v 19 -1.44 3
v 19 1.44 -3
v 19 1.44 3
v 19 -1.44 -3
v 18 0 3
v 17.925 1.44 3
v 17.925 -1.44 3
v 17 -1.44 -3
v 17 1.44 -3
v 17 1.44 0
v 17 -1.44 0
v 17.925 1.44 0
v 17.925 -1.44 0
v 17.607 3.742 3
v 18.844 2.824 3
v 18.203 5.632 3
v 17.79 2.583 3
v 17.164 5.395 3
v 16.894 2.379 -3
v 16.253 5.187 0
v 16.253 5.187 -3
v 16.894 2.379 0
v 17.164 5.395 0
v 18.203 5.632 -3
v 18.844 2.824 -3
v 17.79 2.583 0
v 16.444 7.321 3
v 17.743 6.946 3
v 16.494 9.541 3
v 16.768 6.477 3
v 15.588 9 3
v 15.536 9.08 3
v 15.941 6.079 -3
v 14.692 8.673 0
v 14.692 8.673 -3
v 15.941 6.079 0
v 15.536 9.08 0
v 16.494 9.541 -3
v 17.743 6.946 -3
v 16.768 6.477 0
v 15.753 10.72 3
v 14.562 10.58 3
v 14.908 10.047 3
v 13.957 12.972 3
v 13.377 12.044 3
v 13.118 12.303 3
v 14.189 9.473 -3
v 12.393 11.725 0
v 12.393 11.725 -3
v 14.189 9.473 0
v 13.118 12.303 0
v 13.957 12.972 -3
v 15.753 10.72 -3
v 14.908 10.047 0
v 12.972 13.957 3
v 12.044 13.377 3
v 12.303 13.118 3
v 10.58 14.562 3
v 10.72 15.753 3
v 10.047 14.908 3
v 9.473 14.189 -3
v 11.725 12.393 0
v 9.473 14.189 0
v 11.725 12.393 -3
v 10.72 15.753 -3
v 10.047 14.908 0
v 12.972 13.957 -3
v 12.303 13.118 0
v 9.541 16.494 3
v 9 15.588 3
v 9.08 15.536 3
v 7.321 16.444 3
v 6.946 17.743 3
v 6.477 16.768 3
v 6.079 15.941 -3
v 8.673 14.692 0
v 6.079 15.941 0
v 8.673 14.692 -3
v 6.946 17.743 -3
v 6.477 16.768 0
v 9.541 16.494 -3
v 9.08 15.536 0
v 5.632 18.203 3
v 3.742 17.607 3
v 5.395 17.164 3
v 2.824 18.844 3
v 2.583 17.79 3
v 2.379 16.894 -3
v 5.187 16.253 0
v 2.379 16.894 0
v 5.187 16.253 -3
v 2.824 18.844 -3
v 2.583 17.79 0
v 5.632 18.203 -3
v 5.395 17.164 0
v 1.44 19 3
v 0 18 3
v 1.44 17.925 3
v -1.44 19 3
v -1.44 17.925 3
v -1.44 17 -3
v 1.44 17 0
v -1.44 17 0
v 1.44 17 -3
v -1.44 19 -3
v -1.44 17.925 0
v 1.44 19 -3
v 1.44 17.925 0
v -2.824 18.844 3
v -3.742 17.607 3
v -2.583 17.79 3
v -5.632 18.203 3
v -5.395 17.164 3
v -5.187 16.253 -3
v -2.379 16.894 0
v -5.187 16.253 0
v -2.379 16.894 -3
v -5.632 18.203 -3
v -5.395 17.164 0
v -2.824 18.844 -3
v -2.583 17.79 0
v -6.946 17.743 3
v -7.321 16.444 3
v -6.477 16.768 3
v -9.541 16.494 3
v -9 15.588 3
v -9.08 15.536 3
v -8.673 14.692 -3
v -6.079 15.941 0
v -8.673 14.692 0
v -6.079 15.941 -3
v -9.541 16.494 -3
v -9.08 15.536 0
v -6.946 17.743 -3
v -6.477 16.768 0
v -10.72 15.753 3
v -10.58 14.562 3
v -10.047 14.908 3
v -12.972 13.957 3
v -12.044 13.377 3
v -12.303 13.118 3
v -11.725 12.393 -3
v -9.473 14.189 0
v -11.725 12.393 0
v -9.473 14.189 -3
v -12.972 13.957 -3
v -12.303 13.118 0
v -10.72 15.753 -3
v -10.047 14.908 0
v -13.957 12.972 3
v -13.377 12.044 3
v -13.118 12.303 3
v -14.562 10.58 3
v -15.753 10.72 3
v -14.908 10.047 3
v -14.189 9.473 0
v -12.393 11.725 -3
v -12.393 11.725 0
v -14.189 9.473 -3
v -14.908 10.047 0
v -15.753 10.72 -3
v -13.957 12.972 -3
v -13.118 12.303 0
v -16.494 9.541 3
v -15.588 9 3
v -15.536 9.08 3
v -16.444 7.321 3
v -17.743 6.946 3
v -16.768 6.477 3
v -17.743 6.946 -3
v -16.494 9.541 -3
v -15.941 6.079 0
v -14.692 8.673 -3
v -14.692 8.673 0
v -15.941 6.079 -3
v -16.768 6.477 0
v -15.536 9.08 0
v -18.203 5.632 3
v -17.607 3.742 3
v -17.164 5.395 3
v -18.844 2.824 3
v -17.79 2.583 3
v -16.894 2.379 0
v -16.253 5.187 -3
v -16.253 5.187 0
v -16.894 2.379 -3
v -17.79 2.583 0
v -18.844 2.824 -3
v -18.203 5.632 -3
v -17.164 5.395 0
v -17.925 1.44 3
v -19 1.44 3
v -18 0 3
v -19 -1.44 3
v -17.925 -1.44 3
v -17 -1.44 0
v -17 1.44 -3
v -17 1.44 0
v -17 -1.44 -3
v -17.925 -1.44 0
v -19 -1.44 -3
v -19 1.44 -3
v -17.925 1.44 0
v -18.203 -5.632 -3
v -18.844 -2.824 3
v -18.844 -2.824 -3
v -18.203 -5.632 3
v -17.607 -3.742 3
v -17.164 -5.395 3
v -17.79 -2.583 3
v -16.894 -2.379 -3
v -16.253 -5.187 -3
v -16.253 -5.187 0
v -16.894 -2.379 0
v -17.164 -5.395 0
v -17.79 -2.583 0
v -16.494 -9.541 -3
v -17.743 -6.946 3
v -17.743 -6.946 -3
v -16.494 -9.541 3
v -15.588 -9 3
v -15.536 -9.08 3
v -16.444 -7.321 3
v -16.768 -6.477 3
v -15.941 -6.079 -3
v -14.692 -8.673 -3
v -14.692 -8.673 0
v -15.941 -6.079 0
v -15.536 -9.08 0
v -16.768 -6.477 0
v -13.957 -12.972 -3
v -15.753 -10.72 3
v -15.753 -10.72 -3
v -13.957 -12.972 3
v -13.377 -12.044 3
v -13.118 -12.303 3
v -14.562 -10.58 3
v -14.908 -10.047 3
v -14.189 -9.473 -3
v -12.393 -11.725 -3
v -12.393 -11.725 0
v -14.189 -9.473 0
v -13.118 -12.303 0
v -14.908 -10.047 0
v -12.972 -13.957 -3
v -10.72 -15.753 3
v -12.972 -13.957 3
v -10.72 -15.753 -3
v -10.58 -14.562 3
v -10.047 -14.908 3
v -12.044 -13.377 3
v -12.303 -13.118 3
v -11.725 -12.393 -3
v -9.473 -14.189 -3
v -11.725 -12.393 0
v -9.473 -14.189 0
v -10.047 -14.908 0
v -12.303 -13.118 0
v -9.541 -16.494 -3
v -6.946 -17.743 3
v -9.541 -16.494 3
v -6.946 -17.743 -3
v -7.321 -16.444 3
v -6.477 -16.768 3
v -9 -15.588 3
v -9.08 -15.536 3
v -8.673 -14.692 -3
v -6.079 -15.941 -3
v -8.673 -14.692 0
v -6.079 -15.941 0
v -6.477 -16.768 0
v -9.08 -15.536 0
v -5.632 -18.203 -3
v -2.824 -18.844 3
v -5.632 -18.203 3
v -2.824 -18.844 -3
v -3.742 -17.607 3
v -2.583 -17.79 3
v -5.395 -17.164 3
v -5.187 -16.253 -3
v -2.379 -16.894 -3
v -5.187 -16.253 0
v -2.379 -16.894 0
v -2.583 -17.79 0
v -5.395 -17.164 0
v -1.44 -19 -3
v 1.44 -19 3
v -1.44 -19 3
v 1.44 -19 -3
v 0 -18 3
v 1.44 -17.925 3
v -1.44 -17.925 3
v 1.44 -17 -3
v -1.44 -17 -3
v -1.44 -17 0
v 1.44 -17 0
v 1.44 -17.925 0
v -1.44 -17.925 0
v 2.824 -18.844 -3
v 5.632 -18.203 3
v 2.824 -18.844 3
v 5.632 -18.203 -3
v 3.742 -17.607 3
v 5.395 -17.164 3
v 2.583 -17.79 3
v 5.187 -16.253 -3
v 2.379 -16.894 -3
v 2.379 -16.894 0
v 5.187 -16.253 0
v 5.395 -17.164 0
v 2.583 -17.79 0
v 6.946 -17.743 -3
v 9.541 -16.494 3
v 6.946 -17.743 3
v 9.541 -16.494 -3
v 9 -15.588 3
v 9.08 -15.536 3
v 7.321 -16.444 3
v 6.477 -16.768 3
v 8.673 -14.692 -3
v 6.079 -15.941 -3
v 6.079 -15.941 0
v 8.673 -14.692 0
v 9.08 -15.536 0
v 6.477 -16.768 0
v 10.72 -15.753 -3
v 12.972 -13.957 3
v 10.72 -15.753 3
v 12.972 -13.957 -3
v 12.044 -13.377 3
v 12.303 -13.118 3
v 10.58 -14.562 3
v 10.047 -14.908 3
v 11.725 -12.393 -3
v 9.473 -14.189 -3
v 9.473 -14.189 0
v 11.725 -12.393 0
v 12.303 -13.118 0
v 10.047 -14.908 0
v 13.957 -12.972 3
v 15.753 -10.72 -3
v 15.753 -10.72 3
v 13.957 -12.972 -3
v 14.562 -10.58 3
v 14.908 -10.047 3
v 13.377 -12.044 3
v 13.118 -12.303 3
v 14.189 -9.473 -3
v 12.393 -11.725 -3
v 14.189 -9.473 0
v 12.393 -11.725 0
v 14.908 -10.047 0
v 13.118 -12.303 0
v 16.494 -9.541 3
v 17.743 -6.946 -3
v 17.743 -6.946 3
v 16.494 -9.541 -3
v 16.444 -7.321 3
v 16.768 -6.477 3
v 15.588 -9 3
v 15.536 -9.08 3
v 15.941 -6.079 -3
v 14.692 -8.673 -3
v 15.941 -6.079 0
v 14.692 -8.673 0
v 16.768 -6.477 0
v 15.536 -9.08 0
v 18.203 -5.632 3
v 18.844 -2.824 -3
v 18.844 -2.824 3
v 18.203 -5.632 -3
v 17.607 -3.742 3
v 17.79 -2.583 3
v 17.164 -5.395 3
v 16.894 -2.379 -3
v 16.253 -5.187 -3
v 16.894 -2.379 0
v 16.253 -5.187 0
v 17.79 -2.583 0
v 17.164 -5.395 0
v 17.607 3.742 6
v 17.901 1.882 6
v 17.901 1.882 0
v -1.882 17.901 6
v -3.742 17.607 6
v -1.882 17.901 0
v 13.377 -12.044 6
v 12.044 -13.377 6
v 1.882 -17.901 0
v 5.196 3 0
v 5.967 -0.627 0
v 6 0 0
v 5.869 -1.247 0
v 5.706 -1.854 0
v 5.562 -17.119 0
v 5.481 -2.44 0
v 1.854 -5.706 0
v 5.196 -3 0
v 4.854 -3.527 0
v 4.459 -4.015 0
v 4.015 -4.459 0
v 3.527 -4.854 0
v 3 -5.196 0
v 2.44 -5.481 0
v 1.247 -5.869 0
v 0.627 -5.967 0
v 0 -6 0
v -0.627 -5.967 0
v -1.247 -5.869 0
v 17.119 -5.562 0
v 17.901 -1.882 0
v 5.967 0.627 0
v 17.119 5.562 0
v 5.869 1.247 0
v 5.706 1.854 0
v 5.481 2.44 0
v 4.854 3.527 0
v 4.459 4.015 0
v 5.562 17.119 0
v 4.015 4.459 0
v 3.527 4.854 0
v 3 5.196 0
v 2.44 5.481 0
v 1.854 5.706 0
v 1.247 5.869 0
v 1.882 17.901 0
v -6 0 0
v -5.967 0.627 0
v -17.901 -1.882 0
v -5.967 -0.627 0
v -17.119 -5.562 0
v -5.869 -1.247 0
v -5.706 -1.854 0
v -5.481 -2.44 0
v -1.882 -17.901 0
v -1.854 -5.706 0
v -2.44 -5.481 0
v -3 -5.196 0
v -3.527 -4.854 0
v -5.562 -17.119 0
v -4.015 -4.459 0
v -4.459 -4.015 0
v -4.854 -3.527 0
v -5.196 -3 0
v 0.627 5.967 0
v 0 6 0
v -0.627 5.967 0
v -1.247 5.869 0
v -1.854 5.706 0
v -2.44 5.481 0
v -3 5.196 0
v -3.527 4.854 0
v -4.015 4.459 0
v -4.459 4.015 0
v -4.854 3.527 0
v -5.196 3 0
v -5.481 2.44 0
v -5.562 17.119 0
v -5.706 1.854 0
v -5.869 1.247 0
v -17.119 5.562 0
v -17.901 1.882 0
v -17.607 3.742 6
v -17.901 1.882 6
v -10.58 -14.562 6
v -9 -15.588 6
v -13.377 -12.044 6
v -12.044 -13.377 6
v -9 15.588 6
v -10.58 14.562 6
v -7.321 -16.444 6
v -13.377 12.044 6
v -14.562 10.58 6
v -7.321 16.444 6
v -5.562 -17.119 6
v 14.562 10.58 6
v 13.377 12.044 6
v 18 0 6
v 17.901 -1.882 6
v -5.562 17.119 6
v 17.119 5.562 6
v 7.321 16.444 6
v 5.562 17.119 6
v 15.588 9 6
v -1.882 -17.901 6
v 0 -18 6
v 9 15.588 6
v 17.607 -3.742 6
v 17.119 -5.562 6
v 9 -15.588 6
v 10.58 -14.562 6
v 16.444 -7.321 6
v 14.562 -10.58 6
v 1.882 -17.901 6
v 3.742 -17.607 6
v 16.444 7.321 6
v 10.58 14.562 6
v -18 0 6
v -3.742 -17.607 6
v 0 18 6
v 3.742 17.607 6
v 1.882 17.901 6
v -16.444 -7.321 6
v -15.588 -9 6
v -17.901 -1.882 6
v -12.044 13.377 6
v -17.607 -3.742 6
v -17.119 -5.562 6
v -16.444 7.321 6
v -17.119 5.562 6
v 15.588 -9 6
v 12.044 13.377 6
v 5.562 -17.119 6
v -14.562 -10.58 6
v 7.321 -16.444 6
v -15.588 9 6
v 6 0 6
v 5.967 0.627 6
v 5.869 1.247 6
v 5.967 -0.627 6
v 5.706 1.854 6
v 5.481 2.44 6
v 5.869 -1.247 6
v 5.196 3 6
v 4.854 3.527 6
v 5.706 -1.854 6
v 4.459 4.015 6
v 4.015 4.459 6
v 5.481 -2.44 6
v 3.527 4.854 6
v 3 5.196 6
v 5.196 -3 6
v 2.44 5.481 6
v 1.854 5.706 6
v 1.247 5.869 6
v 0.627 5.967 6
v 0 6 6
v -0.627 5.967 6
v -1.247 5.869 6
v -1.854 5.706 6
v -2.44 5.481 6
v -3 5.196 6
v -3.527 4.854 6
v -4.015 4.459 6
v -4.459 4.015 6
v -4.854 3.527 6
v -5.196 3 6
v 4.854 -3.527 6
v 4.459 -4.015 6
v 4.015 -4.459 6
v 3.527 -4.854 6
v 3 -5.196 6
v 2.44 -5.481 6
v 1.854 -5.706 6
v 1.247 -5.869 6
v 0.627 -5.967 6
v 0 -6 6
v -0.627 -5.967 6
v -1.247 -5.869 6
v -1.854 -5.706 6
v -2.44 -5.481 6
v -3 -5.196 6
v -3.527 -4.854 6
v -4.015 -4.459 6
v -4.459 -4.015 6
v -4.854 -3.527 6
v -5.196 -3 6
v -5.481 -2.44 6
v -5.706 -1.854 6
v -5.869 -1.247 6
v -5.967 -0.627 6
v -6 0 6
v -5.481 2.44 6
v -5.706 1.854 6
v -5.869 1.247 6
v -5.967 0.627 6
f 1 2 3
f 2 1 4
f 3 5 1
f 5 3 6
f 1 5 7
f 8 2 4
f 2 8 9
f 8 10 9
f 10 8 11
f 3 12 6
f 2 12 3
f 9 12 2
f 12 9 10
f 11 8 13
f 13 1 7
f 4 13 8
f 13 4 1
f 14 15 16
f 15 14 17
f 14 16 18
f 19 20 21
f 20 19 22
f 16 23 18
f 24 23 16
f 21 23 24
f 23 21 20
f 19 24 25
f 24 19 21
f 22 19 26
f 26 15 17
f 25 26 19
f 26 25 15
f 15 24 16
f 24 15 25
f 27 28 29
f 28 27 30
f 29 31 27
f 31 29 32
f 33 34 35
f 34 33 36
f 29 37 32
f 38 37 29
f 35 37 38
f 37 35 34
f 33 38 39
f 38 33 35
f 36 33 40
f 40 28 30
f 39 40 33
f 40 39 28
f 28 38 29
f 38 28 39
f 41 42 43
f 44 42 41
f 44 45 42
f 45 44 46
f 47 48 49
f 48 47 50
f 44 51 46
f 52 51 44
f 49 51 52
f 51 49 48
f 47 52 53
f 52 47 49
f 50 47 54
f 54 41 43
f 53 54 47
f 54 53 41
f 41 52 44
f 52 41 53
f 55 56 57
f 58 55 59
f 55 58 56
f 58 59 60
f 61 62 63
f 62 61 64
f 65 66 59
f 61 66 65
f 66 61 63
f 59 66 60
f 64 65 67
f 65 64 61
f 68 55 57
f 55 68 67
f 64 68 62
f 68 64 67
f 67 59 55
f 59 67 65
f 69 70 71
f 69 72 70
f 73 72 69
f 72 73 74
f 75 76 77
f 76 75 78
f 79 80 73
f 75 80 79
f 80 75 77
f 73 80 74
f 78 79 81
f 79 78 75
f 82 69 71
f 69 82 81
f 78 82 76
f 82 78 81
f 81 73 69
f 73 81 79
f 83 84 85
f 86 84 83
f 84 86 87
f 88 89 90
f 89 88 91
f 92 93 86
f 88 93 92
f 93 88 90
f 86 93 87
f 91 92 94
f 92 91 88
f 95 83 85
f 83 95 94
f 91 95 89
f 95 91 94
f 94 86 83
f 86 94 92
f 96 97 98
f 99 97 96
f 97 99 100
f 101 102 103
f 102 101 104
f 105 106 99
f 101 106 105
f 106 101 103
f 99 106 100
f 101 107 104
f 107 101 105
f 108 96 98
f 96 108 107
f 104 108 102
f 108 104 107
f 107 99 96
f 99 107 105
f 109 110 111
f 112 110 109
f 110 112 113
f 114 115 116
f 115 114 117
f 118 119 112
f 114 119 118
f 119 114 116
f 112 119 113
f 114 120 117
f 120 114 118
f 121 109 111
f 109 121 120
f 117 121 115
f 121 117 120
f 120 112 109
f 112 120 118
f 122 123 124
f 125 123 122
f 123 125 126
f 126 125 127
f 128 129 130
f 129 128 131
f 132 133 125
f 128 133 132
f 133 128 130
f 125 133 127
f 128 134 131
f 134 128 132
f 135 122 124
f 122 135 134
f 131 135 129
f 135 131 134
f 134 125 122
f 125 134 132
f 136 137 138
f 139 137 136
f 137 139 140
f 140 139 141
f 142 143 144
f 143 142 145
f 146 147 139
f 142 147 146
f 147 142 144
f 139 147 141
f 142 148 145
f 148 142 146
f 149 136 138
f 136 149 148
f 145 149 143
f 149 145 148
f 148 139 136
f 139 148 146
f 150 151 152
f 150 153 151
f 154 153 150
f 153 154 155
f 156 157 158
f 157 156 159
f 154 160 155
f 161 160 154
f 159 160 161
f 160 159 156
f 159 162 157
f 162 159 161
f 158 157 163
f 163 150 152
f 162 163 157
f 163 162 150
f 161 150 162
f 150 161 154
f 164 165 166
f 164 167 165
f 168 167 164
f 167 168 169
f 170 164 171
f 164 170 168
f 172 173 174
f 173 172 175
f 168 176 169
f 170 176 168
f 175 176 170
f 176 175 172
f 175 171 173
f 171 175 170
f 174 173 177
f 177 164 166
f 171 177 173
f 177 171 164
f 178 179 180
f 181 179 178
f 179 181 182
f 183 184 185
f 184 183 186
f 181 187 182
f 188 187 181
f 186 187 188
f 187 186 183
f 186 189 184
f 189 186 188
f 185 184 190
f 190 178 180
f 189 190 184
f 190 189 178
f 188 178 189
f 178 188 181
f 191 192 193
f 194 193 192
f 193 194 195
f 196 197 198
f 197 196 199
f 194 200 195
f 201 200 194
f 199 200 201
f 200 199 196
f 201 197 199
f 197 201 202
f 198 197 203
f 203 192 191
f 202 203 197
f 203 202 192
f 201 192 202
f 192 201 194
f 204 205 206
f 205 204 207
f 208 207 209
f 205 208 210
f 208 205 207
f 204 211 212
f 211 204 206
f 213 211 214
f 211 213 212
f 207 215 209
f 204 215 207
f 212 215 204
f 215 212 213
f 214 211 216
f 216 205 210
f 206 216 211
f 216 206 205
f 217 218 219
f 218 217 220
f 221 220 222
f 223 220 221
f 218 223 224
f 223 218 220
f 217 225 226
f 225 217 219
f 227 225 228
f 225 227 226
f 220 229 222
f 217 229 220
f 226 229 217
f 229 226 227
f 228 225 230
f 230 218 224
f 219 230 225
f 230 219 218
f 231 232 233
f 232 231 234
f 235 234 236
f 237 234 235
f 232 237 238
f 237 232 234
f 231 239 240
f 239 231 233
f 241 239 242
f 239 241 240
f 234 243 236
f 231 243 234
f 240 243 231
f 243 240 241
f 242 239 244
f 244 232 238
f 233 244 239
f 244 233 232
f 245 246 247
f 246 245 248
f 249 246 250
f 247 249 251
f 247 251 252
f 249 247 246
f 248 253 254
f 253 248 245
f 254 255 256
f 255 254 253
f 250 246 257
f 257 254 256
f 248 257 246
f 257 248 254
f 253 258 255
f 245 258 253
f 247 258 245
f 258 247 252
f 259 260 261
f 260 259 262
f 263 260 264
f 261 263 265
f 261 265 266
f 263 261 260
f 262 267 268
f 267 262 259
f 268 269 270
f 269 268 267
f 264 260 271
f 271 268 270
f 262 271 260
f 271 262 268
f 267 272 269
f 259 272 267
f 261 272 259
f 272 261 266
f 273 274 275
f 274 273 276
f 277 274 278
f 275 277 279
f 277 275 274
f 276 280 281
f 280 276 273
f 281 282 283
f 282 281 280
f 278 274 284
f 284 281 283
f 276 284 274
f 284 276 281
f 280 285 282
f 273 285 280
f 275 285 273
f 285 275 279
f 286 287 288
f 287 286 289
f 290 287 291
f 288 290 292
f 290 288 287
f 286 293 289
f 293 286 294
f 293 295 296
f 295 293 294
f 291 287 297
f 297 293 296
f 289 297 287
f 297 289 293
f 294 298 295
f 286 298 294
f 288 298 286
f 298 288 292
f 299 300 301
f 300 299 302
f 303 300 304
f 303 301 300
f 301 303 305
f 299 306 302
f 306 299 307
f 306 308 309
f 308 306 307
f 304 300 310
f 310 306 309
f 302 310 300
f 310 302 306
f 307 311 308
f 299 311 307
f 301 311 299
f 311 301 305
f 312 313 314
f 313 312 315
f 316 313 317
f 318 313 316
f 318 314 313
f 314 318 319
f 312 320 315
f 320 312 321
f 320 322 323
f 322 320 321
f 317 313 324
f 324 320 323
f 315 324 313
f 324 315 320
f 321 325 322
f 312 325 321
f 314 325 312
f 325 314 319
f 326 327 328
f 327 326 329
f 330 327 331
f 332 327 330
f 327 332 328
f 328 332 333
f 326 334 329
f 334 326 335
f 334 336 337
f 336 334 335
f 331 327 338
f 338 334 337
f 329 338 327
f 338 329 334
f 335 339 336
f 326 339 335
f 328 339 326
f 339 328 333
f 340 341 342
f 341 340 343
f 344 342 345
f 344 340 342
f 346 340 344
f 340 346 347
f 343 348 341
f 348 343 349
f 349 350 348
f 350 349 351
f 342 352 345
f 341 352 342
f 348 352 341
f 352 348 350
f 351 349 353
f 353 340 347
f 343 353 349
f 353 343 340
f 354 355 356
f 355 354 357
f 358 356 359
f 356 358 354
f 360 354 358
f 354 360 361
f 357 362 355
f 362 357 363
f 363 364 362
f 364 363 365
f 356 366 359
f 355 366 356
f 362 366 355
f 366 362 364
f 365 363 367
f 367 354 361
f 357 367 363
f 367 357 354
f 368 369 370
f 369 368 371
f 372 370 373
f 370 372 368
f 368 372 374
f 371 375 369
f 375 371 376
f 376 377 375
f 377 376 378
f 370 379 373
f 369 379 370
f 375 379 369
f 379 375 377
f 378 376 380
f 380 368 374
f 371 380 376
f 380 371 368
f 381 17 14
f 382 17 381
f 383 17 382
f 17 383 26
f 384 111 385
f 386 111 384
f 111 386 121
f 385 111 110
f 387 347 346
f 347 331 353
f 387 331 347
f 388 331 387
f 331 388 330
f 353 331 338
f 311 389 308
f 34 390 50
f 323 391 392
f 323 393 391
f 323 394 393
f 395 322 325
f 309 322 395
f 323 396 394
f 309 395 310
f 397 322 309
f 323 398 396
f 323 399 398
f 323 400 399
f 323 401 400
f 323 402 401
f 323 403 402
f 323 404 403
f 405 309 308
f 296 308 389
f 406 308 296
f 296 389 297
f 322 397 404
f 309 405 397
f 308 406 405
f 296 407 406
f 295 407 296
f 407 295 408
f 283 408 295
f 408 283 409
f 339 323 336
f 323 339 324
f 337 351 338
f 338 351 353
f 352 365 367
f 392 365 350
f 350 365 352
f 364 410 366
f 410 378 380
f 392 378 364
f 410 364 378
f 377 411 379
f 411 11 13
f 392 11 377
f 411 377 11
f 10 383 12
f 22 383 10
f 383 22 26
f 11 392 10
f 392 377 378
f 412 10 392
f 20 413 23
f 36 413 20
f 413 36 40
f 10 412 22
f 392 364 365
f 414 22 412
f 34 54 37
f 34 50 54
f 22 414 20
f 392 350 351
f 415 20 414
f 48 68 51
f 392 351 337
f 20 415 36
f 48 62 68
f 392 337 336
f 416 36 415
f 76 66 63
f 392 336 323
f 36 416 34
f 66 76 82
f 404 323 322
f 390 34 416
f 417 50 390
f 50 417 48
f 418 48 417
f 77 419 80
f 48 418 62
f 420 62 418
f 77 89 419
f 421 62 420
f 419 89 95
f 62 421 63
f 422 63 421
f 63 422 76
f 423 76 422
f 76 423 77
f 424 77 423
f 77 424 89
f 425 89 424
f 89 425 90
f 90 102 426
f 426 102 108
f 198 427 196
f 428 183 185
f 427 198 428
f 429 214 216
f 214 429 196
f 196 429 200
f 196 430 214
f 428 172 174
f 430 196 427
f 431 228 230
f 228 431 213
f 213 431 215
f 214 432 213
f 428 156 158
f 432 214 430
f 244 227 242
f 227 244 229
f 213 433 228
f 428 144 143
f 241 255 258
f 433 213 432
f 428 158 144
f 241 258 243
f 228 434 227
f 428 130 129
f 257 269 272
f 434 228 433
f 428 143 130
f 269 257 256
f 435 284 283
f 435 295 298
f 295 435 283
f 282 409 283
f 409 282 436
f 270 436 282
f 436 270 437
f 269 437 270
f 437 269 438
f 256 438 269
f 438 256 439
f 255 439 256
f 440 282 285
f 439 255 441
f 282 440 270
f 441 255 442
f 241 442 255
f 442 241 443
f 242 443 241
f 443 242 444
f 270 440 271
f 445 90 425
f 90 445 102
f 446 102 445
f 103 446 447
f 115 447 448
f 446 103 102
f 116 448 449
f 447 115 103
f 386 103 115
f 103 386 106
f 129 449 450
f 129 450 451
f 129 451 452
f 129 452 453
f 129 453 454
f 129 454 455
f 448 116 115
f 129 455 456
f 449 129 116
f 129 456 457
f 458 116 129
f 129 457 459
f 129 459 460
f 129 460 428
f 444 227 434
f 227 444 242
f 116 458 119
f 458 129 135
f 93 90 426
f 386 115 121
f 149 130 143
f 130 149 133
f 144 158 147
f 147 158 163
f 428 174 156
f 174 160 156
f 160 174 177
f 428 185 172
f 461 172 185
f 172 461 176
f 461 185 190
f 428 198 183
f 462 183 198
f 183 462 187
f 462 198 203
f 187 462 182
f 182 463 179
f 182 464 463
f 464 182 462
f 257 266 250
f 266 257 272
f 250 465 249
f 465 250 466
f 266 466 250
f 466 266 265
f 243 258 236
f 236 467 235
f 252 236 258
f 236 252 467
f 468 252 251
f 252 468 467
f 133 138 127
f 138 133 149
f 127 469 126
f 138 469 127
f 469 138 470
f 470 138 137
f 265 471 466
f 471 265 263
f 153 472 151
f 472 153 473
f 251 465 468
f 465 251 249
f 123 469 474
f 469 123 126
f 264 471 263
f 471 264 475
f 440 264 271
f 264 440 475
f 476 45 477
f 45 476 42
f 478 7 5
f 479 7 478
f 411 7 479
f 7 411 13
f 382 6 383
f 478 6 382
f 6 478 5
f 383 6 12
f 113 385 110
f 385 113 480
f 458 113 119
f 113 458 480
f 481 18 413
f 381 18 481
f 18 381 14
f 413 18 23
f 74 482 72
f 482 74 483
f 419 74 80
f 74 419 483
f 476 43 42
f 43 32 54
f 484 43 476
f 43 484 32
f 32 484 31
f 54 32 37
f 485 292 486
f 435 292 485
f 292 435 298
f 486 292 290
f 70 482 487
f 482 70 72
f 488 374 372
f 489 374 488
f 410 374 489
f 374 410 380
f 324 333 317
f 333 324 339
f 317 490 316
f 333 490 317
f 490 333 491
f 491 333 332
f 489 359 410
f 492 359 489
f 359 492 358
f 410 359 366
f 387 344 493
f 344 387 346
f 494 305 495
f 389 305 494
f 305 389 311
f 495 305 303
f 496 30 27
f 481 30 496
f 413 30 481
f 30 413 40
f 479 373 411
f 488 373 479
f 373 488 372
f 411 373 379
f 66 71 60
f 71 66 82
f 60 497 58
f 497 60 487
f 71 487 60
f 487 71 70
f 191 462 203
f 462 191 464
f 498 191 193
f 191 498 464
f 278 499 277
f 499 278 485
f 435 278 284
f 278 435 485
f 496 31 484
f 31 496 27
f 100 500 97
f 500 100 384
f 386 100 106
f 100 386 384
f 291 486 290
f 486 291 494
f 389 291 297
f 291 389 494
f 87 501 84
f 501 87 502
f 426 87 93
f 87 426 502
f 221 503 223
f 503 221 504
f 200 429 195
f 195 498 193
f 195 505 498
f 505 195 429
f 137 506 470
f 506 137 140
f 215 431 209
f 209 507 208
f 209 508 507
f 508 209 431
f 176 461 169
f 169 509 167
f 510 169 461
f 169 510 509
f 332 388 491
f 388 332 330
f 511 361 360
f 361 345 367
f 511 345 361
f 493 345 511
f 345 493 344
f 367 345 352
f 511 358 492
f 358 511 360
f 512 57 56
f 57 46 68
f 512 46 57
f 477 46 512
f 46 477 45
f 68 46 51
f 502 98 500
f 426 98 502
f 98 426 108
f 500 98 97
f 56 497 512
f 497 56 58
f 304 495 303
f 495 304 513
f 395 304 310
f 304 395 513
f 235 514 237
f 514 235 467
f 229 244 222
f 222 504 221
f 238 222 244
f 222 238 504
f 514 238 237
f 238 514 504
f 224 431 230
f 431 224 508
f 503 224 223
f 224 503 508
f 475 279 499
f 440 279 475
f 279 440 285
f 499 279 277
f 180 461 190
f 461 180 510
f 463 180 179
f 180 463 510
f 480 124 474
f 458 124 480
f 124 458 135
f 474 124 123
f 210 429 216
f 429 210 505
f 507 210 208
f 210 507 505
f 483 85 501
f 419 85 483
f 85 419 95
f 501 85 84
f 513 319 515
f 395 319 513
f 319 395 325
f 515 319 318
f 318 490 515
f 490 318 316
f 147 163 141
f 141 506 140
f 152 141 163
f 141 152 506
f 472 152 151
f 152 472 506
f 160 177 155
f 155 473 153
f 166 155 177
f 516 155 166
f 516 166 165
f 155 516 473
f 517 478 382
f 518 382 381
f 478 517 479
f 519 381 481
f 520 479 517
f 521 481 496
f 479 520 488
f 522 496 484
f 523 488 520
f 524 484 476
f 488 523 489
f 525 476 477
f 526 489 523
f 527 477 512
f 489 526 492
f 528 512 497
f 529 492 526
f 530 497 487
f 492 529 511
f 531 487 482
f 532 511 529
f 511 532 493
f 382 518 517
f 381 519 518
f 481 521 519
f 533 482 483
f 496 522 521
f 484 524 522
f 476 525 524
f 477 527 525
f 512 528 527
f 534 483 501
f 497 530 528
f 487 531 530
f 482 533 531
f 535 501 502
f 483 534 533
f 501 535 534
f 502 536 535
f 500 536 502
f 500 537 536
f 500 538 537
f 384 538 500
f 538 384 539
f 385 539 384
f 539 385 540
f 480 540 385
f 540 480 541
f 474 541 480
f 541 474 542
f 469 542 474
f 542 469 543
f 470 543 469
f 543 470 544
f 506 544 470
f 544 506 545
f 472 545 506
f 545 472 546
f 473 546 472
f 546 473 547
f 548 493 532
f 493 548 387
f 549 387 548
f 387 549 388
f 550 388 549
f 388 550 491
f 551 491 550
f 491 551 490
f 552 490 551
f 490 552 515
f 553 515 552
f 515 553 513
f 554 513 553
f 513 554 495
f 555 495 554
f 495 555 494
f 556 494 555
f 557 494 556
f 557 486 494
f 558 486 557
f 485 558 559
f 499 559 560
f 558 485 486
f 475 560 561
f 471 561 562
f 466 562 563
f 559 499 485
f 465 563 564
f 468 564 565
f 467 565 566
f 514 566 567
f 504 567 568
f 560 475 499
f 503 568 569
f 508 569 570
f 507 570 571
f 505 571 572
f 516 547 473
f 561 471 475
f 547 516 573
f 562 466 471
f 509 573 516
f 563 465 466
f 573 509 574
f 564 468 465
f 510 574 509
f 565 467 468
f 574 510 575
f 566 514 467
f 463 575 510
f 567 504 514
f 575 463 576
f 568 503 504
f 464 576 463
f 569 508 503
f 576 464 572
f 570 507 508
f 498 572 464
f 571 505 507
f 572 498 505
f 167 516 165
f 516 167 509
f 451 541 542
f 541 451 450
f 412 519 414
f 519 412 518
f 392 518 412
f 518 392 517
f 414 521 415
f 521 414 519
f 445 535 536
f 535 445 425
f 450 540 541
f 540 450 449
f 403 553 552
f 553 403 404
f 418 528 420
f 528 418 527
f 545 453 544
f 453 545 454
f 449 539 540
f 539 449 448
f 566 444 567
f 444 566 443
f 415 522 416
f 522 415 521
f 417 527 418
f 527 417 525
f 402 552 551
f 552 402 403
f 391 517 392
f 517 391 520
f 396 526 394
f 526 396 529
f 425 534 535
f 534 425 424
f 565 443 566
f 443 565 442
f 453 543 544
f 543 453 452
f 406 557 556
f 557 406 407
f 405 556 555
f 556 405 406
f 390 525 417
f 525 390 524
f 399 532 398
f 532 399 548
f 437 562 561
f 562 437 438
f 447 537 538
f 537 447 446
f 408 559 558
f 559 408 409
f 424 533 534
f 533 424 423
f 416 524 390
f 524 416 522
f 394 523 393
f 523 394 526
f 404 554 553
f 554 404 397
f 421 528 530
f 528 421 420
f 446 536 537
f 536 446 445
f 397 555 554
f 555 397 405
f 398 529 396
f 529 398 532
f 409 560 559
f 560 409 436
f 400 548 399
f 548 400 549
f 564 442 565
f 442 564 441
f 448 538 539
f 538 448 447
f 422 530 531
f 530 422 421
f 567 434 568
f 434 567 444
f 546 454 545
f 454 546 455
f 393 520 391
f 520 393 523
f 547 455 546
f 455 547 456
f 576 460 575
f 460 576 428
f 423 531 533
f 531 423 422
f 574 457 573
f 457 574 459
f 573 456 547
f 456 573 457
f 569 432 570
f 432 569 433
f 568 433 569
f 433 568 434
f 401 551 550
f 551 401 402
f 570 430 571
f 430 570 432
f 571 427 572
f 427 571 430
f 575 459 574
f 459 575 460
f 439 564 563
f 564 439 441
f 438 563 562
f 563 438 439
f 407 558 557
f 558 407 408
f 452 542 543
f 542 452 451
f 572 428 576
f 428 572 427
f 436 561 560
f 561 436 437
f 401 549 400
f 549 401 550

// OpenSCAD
// Gear blank with external locator teeth.
$fn = 60;
eps = 0.02;
bore_d = 12;
root_d = 36;
teeth = 28;
thickness = 6;
difference() { union() { cylinder(d=root_d,h=thickness); for(i=[0:teeth-1]) rotate([0,0,i*360/teeth]) translate([root_d/2,0,0]) cube([2,max(2,root_d*0.08),thickness],center=true); } translate([0,0,-eps]) cylinder(d=bore_d,h=thickness+2*eps); }
